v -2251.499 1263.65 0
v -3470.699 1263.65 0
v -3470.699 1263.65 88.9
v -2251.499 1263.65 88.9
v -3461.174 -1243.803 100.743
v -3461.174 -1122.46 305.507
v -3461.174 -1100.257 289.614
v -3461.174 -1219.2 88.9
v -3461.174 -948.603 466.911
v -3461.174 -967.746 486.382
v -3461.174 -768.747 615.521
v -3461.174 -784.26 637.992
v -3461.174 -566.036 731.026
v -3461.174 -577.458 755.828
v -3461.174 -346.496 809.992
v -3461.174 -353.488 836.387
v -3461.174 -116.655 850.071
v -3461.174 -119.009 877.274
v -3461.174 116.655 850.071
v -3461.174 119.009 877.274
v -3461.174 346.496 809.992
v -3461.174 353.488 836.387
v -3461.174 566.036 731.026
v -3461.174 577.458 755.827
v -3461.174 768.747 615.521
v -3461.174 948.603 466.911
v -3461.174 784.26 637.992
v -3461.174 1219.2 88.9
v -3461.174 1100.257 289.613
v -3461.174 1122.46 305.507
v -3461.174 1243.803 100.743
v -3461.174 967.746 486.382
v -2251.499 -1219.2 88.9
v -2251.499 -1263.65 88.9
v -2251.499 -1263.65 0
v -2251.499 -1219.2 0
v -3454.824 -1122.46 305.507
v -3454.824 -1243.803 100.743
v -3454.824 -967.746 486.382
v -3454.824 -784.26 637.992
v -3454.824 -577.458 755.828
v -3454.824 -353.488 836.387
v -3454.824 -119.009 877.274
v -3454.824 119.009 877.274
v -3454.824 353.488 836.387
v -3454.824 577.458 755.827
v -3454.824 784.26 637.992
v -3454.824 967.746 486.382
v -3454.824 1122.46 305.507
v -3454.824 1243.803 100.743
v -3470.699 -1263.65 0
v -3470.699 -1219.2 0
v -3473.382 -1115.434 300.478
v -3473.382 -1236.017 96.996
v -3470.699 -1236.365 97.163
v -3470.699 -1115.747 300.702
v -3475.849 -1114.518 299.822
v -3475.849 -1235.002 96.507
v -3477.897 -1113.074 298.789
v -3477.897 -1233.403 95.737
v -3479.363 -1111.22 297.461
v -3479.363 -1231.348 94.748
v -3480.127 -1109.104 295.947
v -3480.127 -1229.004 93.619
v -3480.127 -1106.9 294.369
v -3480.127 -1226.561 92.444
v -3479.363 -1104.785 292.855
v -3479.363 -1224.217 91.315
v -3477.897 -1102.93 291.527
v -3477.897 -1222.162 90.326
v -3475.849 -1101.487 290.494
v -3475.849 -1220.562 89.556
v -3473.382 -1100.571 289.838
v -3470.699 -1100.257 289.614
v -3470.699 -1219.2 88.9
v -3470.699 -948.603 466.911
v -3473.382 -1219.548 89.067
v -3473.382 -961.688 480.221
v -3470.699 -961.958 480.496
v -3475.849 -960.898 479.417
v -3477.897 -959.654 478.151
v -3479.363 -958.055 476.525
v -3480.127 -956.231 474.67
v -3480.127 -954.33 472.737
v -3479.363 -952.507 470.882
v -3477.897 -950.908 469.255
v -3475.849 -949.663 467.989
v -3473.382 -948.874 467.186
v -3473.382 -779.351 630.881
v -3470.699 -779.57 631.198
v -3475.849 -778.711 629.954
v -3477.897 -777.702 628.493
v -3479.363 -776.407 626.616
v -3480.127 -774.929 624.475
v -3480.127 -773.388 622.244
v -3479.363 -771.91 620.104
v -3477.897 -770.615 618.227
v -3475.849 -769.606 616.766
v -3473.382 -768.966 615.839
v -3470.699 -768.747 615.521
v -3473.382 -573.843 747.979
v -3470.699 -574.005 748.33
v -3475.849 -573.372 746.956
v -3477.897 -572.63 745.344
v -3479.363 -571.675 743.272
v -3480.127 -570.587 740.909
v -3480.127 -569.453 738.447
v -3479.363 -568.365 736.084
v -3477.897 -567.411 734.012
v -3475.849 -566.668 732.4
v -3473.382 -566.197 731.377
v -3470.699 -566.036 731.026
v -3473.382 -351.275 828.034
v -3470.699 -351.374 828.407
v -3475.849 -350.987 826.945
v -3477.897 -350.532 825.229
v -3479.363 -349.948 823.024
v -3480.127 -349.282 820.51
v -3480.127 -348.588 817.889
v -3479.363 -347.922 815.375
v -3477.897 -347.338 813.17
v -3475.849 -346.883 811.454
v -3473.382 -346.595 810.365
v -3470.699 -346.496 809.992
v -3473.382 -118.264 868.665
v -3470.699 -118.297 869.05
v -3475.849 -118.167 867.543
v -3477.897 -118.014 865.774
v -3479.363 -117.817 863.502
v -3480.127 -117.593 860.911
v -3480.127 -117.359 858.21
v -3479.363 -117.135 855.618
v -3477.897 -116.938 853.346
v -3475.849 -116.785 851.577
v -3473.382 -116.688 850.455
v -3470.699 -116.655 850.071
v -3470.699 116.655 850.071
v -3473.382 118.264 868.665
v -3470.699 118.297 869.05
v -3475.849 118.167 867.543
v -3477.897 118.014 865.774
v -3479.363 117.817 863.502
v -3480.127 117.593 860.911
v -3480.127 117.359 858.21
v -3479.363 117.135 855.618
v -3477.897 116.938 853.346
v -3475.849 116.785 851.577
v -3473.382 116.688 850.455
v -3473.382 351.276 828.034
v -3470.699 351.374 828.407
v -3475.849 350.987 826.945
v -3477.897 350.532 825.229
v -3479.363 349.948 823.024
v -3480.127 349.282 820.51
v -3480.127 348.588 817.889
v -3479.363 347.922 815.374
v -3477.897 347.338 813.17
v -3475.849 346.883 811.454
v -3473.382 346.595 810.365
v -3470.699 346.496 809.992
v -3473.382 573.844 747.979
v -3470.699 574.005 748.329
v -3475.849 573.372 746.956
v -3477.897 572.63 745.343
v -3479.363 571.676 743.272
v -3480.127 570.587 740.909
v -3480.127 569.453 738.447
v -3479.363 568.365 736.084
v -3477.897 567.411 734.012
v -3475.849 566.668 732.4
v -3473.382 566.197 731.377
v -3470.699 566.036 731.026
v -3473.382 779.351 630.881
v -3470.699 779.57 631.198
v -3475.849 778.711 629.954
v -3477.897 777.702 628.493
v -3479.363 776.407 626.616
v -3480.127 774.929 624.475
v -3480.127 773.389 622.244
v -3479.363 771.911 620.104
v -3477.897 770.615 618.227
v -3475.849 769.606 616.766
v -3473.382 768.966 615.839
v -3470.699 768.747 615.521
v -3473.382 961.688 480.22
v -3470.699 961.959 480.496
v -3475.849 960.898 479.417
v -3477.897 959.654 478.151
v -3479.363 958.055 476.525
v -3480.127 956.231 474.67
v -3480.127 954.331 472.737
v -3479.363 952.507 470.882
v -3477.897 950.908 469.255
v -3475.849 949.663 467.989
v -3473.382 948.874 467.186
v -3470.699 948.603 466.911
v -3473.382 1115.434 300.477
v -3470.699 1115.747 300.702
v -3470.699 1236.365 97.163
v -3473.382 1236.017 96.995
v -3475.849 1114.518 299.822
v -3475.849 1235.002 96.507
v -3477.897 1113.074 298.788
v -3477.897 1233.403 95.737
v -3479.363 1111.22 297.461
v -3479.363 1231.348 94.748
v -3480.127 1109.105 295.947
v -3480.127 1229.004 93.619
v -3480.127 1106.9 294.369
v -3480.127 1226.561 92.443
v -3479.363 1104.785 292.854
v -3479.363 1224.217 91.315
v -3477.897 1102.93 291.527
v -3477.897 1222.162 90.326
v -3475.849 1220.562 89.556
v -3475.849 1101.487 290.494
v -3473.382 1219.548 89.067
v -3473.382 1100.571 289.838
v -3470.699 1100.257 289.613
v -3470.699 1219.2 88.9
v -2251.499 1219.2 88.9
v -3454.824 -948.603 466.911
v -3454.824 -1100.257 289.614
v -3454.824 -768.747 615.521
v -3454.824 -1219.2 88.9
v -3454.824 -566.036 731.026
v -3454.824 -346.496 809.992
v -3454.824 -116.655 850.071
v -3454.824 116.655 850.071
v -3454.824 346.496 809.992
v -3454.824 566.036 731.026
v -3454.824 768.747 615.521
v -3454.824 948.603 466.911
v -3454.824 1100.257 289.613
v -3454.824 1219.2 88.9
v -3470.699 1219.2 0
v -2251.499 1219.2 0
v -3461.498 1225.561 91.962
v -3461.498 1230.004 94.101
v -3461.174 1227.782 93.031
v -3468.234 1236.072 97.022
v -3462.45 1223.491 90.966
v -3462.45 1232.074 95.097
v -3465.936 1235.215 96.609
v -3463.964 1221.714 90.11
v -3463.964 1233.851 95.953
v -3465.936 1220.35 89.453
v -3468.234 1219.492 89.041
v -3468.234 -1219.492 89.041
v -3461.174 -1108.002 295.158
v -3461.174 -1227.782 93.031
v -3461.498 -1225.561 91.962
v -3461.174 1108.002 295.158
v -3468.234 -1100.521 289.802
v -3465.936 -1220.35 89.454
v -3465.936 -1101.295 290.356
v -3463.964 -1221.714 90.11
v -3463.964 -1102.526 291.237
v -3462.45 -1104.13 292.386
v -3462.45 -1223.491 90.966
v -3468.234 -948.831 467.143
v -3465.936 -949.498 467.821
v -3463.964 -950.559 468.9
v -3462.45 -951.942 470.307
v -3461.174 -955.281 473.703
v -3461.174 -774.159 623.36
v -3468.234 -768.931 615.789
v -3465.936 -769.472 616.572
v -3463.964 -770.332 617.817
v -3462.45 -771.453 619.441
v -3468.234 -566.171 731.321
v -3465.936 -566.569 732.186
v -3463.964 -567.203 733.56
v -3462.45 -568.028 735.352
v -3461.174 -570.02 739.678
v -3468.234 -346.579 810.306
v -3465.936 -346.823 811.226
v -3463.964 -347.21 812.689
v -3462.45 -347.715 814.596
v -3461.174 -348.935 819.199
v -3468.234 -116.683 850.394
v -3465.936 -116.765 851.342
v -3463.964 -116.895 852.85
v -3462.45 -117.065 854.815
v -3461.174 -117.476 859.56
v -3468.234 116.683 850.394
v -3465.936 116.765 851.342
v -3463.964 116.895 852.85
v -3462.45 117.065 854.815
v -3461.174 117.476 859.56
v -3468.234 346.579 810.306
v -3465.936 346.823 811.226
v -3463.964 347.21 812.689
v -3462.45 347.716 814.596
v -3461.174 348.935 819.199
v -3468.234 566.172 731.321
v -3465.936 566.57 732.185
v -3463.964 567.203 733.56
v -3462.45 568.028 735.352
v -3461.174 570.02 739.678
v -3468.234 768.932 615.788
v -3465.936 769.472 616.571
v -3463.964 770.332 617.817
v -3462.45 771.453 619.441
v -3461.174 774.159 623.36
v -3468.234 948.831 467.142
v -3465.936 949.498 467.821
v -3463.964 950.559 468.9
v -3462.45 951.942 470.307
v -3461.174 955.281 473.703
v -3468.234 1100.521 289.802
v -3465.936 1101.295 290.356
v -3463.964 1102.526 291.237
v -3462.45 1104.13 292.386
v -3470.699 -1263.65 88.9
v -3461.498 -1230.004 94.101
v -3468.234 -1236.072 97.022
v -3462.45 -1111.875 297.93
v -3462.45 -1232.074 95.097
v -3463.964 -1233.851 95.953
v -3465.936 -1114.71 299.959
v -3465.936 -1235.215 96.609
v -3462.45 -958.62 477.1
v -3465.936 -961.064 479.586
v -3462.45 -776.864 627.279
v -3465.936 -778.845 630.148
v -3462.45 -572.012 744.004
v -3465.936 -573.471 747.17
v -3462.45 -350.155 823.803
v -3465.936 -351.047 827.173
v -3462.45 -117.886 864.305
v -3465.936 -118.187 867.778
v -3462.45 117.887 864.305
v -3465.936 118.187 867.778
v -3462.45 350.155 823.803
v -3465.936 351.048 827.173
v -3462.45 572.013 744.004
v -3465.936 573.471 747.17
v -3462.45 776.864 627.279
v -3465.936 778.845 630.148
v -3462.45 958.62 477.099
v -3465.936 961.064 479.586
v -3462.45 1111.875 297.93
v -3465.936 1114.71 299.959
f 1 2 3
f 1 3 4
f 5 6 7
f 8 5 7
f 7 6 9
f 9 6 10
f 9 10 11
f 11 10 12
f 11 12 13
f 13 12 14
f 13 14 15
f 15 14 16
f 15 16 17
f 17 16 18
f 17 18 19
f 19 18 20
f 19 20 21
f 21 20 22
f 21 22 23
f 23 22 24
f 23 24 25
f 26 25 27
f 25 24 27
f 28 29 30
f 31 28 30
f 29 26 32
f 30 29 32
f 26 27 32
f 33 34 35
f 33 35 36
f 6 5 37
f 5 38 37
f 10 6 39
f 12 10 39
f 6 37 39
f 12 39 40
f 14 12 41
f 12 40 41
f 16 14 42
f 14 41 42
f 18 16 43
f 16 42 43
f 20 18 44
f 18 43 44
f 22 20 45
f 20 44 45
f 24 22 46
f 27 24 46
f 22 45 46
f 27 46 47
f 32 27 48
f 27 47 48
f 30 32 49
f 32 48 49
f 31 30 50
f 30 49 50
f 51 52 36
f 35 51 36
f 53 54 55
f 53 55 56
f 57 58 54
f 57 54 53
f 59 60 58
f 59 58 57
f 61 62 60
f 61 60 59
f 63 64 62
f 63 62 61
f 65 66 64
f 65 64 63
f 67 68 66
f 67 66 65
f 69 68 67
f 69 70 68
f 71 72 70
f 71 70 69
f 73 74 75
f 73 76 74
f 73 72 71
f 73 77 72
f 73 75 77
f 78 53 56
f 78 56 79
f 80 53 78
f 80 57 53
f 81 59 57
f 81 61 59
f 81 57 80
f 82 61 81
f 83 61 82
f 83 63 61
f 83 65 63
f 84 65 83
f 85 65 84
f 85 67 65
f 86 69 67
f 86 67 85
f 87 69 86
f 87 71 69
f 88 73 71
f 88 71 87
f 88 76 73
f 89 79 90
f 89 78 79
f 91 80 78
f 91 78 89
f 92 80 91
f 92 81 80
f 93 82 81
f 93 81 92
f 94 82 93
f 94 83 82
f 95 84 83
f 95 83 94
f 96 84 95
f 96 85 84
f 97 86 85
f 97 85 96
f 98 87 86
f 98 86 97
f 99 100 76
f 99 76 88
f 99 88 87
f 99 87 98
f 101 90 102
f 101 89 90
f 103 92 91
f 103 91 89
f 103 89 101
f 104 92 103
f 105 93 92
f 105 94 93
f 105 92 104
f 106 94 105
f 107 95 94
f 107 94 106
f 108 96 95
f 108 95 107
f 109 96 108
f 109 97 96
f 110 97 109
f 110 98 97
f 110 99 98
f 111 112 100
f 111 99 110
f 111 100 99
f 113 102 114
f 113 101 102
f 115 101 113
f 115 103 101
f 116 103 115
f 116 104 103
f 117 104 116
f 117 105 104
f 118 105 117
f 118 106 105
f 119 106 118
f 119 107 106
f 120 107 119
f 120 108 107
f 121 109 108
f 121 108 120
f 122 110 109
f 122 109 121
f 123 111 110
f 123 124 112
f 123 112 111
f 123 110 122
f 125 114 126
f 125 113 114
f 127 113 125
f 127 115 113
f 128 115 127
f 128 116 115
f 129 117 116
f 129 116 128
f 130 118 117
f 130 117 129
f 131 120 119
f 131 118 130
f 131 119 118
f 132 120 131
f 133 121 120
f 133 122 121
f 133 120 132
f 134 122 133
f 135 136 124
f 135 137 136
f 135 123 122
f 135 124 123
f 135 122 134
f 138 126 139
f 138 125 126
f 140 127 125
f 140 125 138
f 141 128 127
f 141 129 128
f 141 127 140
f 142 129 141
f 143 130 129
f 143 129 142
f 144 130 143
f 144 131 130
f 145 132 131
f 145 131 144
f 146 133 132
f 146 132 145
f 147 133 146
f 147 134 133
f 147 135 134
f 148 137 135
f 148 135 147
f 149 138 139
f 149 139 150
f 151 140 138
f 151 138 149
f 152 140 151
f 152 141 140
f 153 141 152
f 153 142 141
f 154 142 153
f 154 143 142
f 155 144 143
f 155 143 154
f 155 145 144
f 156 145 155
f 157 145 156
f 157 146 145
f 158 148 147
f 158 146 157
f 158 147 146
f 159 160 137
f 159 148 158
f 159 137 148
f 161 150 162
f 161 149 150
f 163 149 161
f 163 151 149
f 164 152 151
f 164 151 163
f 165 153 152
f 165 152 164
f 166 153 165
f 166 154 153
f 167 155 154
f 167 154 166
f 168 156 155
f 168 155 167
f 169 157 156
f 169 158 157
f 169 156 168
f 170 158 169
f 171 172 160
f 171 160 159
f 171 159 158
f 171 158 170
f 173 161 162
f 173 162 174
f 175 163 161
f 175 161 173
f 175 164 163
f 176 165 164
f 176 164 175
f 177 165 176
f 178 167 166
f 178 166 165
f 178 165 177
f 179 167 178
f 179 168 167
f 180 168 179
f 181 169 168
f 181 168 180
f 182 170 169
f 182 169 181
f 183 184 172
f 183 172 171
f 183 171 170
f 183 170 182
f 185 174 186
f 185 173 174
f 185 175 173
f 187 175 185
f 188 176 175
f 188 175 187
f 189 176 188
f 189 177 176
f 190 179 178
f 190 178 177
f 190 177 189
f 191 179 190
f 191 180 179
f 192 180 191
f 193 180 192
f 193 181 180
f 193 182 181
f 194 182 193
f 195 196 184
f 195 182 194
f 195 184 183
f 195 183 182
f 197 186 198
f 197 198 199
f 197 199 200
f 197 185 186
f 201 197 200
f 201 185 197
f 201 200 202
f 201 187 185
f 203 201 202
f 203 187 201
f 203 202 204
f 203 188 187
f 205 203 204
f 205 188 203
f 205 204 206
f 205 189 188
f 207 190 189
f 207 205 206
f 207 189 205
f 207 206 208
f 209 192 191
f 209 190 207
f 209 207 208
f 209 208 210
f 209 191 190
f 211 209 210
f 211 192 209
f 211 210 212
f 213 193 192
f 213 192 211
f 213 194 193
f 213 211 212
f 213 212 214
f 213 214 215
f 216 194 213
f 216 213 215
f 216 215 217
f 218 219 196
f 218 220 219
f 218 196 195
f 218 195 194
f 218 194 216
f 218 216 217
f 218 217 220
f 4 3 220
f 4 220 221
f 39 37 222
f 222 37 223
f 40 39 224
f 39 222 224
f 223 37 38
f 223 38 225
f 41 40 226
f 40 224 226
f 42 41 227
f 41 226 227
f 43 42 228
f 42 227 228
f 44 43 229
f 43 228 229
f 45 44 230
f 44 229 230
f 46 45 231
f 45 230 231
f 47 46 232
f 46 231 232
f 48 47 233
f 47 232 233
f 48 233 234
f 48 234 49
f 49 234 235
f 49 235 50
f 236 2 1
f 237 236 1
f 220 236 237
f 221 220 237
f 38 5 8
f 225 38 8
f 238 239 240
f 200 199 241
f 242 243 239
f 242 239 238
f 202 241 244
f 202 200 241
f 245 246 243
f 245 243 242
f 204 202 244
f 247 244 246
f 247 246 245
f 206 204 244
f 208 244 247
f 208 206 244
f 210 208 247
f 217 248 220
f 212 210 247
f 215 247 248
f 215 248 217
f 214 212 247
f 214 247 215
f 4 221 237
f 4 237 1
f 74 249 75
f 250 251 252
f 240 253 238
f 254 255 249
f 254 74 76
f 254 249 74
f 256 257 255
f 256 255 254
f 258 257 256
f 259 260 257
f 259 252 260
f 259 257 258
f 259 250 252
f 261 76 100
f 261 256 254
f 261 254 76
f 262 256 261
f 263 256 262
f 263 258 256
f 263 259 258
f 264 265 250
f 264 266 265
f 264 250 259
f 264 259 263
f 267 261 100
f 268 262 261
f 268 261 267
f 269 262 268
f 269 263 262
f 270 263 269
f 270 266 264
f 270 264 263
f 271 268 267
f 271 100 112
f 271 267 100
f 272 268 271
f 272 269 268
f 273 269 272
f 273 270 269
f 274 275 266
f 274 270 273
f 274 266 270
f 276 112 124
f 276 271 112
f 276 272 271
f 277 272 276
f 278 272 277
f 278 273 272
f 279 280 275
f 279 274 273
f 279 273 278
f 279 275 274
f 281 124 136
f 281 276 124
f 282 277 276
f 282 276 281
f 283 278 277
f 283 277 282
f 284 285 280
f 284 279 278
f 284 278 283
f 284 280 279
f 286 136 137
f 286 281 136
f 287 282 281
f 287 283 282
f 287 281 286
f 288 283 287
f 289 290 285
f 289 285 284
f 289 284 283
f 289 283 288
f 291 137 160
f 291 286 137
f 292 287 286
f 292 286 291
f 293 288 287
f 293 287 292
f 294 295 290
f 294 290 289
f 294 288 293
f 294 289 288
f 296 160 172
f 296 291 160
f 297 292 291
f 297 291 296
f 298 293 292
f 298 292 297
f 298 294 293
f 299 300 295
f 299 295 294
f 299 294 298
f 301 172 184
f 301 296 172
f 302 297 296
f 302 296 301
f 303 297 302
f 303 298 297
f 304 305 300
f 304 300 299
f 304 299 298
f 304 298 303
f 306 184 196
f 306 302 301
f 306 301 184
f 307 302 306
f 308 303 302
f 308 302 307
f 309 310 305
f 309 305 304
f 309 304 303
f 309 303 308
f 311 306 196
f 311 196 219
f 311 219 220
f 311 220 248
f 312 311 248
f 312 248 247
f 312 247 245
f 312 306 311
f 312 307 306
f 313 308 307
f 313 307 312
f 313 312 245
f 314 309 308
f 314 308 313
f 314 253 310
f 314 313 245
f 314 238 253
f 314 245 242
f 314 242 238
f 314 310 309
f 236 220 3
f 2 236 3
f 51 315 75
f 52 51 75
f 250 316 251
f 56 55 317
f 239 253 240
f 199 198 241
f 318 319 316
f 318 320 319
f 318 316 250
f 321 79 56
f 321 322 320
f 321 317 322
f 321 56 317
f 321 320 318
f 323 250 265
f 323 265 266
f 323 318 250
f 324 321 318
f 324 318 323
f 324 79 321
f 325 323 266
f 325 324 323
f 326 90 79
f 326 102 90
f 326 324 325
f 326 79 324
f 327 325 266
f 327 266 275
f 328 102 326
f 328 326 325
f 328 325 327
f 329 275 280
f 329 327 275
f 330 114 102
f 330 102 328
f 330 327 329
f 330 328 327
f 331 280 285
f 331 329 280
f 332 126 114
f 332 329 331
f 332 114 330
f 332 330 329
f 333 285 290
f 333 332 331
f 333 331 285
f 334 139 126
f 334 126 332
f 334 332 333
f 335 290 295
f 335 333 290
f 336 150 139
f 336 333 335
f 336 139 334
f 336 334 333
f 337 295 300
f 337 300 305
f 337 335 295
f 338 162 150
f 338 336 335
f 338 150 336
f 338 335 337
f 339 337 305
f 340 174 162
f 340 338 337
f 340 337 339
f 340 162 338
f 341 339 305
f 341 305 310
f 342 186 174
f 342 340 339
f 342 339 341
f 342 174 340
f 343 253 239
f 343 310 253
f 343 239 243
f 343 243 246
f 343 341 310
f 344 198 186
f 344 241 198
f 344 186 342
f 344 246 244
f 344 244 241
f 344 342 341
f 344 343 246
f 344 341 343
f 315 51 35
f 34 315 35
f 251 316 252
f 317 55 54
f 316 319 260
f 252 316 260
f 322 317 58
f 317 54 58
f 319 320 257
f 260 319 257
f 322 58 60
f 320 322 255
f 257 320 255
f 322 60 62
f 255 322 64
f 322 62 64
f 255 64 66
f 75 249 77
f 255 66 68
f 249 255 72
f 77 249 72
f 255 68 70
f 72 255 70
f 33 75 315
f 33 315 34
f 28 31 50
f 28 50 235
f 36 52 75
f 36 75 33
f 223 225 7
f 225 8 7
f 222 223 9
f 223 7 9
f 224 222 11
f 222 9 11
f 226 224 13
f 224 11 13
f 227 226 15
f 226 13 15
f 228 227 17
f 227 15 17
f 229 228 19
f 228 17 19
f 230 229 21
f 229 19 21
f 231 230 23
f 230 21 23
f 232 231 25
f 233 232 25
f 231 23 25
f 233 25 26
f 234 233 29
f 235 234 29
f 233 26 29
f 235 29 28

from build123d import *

# Parameters (mm, degrees)
F0_W     = 1219.2
F0_H     = 44.45
F1_DEPTH = 88.9


with BuildPart() as f1:
    # F0 (on Top) → F1 (new body)
    with BuildSketch(Plane.XY):
        with Locations((-2861.098913, 1241.425)):
            Rectangle(F0_W, F0_H)
        with Locations((-2861.098913, -1241.425)):
            Rectangle(F0_W, F0_H)
    extrude(amount=F1_DEPTH)


with BuildPart() as f5:
    # F5: sweep along a path in F2
    with BuildLine(Plane(origin=(-3470.698913, 0, 0), x_dir=(0, -1, 0), z_dir=(-1, 0, 0))) as f5_path:
        ThreePointArc((1236.364763, 97.162772), (0, 874.15854), (-1236.364763, 97.162772))
    # F4 (on face) → F5 (sweep)
    with BuildSketch(Plane(origin=(0, 194.62632, -404.309187), x_dir=(1, 0, 0), z_dir=(0, 0.433741, -0.901037))):
        with BuildLine():
            ThreePointArc((-3470.698913, -1137.104449), (-3480.223913, -1146.629449), (-3470.698913, -1156.154449))
            Line((-3470.698913, -1156.154449), (-3470.698913, -1137.104449))
        make_face()
        with BuildLine():
            Line((-3470.698913, -1137.104449), (-3470.698913, -1156.154449))
            ThreePointArc((-3470.698913, -1156.154449), (-3463.963721, -1153.364641), (-3461.173913, -1146.629449))
            ThreePointArc((-3461.173913, -1146.629449), (-3463.963721, -1139.894257), (-3470.698913, -1137.104449))
        make_face()
    sweep(path=f5_path.line)


with BuildPart() as f8:
    # F8: sweep along a path in F2
    with BuildLine(Plane(origin=(-3470.698913, 0, 0), x_dir=(0, -1, 0), z_dir=(-1, 0, 0))) as f8_path:
        ThreePointArc((1236.364763, 97.162772), (0, 874.15854), (-1236.364763, 97.162772))
    # F7 (on face) → F8 (sweep)
    with BuildSketch(Plane(origin=(0, 194.62632, -404.309187), x_dir=(1, 0, 0), z_dir=(0, 0.433741, -0.901037))):
        Polygon((-3454.823913, -1137.104449), (-3461.173913, -1137.104449), (-3461.173913, -1146.629449), (-3461.173913, -1164.409449), (-3454.823913, -1164.409449), align=None)
    sweep(path=f8_path.line)


solid = Compound([f1.part, f5.part, f8.part])
